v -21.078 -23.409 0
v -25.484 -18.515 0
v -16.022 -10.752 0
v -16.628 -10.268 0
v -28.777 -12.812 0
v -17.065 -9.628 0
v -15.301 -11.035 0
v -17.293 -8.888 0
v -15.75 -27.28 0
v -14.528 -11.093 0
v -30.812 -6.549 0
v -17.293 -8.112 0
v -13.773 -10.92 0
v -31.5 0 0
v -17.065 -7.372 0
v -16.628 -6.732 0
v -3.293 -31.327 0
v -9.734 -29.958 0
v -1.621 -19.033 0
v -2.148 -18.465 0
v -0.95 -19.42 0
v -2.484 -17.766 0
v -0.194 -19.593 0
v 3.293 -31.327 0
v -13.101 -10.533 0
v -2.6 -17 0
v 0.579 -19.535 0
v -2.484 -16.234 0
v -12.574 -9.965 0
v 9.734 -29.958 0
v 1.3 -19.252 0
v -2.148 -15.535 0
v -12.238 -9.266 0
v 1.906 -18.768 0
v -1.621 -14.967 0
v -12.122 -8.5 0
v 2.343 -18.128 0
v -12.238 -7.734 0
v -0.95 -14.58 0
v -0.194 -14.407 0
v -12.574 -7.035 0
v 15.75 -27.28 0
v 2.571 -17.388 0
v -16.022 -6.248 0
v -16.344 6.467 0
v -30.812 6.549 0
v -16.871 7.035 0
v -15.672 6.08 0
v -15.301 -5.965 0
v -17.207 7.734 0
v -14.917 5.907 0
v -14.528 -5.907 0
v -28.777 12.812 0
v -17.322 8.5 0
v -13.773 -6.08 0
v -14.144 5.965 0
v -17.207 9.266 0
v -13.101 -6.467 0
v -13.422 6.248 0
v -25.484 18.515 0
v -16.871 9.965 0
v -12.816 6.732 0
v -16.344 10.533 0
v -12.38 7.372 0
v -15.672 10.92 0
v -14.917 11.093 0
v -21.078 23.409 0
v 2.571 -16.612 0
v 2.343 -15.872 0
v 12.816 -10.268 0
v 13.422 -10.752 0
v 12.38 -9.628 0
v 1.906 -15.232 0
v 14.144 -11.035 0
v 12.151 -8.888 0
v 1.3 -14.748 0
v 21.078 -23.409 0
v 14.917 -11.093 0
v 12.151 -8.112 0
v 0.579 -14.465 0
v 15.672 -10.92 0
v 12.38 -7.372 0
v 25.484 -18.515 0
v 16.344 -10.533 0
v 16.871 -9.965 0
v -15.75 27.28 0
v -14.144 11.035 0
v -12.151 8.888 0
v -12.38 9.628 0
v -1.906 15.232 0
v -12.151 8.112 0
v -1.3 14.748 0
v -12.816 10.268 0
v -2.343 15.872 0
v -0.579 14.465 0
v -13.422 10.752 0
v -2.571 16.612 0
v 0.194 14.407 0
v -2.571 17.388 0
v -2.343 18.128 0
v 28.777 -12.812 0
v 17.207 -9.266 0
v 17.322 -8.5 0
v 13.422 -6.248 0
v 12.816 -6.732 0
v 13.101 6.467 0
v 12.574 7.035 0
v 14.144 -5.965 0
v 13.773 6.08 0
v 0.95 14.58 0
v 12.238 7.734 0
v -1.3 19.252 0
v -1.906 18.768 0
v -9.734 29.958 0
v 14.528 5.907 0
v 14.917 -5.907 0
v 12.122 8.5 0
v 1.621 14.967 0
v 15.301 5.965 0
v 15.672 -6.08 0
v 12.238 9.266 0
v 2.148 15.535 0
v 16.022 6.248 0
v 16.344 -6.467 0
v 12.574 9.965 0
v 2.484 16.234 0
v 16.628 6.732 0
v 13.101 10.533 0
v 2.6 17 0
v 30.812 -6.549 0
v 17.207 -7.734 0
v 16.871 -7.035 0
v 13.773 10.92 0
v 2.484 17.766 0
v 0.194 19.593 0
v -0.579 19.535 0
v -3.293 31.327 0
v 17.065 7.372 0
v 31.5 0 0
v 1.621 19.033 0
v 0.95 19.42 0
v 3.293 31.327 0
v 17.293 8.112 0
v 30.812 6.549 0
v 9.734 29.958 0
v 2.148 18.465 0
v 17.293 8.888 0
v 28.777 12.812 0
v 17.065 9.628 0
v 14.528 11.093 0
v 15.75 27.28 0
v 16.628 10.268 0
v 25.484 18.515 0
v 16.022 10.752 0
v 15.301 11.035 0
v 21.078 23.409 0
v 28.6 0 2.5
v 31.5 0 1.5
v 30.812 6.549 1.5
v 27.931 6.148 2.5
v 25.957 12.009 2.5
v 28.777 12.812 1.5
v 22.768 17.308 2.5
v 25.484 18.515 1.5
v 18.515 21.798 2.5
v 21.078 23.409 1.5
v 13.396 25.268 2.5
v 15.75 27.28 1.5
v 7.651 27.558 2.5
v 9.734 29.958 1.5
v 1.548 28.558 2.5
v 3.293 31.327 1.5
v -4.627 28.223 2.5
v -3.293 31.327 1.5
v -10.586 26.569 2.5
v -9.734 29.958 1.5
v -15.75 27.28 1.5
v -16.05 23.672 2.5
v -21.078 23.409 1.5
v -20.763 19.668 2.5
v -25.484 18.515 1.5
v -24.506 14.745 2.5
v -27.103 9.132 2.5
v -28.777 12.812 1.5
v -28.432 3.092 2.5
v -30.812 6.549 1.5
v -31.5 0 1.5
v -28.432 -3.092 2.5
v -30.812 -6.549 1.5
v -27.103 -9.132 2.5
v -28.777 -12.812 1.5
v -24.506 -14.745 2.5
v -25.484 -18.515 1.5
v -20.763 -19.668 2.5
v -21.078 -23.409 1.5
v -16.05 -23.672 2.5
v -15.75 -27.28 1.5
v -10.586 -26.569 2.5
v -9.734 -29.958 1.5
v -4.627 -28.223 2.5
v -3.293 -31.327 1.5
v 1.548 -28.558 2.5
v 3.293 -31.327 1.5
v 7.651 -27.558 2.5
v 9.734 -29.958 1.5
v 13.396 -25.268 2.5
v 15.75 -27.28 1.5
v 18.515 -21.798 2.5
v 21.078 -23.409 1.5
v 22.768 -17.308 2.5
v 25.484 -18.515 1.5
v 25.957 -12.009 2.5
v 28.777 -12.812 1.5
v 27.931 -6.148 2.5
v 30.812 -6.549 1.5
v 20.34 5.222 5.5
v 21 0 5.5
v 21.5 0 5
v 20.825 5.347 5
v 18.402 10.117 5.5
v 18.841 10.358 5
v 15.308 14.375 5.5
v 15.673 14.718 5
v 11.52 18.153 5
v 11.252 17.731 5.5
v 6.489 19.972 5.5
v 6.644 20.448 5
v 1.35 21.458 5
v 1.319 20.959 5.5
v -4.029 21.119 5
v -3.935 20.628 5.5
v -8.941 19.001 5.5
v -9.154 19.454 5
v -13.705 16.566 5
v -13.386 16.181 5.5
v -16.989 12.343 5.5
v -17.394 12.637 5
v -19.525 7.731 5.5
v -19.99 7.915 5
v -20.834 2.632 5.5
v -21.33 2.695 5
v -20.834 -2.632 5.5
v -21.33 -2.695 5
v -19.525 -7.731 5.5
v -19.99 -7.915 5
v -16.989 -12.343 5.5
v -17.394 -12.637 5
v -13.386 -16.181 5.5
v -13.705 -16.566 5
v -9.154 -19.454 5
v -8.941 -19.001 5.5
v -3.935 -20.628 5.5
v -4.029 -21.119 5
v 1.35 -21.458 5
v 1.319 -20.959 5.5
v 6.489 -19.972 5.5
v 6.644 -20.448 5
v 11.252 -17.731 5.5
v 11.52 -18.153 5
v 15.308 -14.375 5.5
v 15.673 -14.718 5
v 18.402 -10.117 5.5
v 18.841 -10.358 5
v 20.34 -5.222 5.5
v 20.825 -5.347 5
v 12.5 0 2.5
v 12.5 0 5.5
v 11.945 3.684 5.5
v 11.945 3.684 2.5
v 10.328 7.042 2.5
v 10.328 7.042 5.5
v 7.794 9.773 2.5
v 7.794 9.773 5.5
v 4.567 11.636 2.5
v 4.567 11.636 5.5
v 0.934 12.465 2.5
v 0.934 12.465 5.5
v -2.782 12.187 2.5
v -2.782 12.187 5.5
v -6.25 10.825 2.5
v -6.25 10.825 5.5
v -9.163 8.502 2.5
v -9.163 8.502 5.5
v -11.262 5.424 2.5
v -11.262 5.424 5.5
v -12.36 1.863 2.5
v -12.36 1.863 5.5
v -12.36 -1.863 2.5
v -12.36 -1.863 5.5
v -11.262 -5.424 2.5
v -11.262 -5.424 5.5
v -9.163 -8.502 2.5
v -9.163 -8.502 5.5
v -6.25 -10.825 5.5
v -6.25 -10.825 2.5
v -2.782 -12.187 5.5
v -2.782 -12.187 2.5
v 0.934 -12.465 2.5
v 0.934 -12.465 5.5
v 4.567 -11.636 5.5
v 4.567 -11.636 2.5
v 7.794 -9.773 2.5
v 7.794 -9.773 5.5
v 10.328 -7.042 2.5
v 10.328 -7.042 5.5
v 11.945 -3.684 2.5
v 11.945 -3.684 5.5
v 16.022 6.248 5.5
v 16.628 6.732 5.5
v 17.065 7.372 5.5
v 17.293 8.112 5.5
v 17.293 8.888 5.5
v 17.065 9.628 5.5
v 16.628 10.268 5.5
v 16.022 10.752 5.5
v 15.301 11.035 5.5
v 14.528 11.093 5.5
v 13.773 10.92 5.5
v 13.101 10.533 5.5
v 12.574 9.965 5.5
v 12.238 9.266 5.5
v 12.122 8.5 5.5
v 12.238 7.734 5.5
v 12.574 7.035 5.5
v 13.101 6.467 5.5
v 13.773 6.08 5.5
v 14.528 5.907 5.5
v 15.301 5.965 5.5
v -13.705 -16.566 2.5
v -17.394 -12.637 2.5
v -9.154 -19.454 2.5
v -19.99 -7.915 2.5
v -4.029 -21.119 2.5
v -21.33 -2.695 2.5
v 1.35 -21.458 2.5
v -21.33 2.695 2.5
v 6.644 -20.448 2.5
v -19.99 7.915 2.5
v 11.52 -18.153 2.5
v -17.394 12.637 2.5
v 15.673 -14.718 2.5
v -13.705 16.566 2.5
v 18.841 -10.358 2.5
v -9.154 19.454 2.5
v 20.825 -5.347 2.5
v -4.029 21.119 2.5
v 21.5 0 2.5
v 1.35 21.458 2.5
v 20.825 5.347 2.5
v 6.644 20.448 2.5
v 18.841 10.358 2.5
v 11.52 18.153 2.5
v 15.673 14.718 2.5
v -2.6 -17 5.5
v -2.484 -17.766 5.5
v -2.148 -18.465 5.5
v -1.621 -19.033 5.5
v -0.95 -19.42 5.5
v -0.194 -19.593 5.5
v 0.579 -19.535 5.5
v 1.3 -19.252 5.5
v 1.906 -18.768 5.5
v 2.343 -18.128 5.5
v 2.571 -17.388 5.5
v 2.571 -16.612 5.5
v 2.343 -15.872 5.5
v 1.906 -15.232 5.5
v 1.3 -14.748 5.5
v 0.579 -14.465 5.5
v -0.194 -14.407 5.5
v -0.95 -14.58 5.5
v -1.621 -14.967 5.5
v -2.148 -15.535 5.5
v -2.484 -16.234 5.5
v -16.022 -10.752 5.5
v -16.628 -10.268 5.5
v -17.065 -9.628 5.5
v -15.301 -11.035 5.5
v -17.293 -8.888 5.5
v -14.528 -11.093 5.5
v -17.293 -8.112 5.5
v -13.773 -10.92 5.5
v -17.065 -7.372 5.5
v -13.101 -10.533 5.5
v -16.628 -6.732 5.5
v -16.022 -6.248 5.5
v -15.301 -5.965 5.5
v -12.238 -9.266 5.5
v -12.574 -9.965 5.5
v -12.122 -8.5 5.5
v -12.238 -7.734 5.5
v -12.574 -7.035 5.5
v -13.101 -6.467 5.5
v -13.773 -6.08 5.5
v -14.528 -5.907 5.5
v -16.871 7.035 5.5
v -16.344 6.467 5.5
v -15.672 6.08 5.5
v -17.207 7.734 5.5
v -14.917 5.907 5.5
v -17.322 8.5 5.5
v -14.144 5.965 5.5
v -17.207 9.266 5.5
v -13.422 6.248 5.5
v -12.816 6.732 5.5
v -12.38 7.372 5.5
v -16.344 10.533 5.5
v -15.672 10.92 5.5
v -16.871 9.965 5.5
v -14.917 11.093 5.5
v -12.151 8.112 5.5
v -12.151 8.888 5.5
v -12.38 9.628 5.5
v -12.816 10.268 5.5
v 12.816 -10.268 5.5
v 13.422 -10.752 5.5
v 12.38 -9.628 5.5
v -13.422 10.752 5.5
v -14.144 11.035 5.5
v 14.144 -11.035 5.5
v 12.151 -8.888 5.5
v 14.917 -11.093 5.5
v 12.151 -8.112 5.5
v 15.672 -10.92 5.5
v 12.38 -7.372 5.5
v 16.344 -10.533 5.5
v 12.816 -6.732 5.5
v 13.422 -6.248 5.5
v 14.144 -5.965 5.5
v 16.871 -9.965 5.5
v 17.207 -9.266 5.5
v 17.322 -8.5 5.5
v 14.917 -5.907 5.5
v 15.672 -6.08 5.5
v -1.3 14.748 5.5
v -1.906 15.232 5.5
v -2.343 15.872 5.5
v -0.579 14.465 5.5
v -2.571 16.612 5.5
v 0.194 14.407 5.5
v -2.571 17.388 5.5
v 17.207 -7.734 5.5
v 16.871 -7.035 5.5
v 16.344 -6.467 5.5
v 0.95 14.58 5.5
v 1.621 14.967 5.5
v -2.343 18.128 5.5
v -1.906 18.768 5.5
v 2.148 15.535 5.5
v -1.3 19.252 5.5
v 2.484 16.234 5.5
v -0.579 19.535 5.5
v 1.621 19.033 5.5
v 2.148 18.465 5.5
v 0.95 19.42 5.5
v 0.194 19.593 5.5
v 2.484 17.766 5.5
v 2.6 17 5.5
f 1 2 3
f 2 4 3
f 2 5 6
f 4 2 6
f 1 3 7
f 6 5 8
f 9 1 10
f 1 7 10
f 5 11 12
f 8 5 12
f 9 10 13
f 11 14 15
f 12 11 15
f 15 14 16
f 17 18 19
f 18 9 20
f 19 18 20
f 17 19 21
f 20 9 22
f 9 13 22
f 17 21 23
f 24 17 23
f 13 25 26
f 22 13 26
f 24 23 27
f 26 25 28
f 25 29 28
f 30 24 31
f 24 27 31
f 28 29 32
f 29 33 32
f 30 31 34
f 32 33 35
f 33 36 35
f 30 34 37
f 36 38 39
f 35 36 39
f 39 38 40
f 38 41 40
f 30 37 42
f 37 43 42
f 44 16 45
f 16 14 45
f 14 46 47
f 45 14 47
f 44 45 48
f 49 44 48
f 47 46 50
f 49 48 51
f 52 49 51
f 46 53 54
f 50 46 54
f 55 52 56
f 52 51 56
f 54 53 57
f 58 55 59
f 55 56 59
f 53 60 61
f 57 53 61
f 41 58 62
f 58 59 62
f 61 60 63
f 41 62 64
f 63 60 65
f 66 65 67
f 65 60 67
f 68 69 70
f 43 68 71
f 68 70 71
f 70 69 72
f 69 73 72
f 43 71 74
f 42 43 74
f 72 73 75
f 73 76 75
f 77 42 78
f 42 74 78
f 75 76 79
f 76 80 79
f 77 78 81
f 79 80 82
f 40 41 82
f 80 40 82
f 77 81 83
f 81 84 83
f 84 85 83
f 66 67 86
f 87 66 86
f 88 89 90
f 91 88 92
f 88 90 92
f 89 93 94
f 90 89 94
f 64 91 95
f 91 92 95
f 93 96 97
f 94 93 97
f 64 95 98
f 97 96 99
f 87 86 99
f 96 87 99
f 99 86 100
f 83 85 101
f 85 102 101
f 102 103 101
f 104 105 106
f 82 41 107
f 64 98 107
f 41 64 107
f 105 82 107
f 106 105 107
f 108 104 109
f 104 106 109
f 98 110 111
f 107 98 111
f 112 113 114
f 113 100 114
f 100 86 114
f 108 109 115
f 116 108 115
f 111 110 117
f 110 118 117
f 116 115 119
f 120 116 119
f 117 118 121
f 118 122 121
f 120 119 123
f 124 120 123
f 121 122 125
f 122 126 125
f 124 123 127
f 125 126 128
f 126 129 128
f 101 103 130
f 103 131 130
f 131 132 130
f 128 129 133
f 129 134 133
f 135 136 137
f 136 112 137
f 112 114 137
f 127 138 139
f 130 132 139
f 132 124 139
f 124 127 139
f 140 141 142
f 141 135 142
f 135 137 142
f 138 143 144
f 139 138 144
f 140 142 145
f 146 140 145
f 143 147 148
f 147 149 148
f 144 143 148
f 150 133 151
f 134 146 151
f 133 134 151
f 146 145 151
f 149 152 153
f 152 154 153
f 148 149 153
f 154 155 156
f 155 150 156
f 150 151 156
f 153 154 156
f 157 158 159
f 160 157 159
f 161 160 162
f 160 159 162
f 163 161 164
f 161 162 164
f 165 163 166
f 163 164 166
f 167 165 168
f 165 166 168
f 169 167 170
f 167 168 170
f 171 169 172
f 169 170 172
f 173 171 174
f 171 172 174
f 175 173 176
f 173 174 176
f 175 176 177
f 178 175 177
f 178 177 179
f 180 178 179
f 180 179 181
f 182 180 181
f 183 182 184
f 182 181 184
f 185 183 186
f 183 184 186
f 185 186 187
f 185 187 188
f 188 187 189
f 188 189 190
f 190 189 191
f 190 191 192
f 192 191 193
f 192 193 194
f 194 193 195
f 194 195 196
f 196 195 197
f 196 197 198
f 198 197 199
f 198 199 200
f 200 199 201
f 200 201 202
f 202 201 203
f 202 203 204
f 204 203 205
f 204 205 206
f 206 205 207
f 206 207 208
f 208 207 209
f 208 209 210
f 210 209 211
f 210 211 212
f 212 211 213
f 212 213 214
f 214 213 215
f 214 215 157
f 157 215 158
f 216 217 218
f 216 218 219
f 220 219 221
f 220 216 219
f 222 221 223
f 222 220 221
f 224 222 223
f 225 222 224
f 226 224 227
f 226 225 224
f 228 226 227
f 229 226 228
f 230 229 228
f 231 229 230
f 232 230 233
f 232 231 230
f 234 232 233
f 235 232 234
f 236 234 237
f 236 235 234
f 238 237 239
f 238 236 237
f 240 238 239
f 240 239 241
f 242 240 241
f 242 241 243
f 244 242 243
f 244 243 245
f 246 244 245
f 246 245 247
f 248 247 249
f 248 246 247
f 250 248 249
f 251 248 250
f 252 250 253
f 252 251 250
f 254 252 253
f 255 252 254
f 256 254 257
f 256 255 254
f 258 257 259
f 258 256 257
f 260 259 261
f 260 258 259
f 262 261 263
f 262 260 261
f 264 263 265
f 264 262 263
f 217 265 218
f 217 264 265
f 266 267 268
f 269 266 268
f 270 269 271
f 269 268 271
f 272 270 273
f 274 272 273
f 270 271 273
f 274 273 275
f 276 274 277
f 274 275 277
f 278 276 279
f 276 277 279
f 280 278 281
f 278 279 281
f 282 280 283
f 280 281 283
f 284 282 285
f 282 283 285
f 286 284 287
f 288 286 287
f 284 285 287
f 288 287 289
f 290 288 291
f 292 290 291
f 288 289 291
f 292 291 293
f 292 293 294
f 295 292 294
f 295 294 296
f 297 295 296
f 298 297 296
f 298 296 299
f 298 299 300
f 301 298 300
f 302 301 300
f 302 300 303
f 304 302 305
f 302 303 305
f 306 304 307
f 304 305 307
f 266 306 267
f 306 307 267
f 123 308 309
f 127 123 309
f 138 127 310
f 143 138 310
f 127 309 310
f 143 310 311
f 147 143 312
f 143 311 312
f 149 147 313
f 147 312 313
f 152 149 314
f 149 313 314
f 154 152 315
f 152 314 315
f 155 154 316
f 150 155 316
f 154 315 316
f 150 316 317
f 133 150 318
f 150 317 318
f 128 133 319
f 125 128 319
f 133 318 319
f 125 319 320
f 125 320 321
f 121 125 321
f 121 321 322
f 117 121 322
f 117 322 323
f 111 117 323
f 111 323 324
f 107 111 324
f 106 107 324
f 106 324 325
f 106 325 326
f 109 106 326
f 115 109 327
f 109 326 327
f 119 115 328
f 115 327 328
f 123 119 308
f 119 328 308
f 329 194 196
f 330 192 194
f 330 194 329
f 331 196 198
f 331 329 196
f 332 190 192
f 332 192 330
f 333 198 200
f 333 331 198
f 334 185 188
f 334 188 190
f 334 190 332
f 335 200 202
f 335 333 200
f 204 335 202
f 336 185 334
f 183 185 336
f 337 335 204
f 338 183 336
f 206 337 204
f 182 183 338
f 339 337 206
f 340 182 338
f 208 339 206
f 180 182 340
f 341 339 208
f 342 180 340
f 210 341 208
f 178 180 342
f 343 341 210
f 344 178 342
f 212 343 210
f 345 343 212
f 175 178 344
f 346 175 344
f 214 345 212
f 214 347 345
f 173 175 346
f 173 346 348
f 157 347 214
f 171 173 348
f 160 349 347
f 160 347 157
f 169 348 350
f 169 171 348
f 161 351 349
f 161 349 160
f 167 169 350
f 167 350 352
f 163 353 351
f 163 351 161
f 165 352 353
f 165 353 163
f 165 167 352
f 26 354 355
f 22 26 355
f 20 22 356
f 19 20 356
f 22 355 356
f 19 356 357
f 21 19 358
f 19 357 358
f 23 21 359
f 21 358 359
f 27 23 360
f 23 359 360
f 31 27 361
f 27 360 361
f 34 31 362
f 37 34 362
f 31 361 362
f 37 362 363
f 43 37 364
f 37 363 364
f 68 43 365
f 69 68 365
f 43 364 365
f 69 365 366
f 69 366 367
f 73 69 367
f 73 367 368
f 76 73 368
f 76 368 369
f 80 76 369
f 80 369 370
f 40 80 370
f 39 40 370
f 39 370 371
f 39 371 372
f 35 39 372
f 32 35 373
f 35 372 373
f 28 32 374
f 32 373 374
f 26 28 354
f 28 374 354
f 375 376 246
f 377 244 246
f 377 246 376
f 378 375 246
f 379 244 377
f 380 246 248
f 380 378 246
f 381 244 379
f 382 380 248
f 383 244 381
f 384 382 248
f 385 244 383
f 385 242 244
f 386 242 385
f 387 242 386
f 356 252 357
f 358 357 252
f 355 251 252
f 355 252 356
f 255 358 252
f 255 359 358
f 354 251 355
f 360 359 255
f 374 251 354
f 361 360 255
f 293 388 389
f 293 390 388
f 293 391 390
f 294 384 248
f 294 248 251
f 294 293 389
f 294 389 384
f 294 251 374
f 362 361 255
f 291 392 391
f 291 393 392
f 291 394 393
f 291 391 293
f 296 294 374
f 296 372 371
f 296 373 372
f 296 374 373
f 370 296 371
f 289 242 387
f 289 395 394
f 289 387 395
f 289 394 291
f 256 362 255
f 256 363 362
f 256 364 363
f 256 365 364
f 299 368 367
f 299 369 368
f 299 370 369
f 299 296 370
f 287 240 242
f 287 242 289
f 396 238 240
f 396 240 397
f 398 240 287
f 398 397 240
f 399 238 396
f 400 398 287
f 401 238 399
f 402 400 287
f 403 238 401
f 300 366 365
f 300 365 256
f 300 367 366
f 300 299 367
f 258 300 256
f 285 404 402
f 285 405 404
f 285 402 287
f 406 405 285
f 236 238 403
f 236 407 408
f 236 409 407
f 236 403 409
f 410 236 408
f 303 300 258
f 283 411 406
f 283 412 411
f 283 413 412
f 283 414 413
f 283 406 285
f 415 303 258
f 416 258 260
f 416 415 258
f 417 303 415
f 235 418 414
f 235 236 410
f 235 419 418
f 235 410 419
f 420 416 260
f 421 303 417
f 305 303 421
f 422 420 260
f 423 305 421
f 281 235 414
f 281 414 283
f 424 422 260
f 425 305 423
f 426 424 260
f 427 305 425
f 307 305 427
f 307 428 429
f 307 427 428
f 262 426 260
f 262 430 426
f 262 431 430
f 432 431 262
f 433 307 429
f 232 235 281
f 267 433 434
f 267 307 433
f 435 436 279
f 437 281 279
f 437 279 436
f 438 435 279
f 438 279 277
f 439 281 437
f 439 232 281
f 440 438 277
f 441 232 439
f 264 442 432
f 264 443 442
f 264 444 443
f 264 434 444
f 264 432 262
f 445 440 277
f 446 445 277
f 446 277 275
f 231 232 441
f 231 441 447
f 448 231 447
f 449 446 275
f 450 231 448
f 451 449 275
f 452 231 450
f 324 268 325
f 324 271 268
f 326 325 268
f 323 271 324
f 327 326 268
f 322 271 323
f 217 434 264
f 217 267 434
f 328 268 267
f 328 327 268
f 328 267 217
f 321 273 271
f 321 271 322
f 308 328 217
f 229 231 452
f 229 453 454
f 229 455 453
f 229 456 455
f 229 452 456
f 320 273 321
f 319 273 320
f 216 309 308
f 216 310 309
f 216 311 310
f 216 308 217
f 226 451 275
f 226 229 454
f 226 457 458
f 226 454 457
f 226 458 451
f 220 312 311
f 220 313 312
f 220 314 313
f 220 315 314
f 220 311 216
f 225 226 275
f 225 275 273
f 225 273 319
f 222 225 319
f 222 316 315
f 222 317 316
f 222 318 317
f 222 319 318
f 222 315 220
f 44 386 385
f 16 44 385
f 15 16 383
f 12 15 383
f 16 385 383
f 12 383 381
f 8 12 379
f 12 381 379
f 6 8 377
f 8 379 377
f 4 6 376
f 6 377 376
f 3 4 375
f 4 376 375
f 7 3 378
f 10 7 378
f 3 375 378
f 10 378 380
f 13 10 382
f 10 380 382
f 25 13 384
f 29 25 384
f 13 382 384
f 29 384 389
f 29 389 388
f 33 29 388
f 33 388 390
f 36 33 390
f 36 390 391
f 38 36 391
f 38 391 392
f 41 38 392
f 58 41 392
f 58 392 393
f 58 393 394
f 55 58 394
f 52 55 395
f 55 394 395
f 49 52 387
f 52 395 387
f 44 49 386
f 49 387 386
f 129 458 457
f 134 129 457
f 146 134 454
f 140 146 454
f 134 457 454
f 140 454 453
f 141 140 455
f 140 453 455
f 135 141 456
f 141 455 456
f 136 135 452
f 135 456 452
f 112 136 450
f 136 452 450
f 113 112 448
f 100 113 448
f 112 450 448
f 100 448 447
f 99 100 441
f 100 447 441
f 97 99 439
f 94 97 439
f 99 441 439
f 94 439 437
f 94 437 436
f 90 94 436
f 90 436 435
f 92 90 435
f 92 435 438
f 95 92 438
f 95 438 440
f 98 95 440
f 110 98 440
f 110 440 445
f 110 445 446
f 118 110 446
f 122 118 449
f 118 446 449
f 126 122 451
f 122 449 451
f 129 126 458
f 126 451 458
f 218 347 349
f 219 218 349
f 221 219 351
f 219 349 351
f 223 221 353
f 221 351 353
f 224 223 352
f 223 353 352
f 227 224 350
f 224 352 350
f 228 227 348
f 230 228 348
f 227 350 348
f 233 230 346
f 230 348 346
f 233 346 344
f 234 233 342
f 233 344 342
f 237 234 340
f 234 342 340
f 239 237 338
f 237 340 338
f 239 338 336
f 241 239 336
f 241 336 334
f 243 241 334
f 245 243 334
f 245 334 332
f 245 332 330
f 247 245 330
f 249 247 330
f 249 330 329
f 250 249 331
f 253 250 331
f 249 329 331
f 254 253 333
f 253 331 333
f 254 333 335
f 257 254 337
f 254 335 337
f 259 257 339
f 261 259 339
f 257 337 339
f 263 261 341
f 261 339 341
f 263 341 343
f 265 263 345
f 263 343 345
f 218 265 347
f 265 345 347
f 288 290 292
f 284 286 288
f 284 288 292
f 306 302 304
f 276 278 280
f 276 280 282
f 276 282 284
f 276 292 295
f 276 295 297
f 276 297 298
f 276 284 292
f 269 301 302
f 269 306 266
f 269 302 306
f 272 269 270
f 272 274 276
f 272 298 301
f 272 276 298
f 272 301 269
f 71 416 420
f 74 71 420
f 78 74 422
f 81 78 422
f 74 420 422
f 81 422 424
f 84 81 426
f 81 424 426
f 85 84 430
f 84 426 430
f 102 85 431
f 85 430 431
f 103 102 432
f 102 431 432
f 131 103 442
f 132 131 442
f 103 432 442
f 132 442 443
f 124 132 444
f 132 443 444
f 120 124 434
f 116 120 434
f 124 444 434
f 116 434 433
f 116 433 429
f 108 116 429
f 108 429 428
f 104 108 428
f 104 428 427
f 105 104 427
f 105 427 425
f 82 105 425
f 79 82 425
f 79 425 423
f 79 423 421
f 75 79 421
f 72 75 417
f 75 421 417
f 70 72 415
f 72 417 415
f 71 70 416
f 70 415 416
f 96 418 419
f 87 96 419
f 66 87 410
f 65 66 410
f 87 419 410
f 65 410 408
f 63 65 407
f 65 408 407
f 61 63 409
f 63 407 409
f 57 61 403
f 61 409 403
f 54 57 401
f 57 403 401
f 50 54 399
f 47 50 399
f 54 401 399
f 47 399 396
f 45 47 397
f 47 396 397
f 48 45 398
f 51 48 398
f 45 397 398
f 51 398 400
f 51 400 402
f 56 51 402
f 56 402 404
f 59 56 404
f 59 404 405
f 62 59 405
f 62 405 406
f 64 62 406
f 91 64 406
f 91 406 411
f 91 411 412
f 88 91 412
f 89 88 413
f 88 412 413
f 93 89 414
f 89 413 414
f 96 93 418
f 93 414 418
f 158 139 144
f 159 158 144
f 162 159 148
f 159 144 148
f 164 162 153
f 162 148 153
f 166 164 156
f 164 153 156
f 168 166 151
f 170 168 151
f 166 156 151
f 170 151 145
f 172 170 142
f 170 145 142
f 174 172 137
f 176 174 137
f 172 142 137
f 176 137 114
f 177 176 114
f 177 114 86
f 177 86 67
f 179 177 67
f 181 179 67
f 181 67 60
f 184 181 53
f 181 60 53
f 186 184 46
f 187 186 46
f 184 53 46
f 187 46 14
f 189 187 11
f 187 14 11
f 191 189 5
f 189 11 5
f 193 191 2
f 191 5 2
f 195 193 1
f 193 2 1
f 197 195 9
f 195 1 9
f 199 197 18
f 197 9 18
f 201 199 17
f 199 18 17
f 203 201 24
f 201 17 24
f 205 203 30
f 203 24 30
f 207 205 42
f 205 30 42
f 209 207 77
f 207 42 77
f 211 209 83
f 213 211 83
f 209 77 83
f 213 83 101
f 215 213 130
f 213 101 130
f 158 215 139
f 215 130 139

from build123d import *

# Parameters (mm, degrees)
F0_R     = 31.5
F1_DEPTH = 2.5
F2_R     = 21.5
F3_DEPTH = 3
F4_SIZE2 = 1
F4_SIZE  = 2.9
F5_R     = 2.6
F6_DEPTH = 5.5
F8_COUNT = 6
F7_R     = 12.5
F9_DEPTH = 3
F10_SIZE = 0.5


with BuildPart() as f1:
    # F0 (on Top) → F1 (new body)
    with BuildSketch(Plane.XY):
        Circle(F0_R)
    extrude(amount=F1_DEPTH)

    # F2 (on face) → F3 (join)
    with BuildSketch(Plane.XY.offset(2.5)):
        Circle(F2_R)
    extrude(amount=F3_DEPTH)

    # F4
    f4_edges = [f1.edges().sort_by_distance(p)[0] for p in [
        (-31.5, 0, 2.5),
    ]]
    f4_side = f1.faces().sort_by_distance((-30.609045, 0, 2.5))[0]
    chamfer(f4_edges, length=F4_SIZE, length2=F4_SIZE2, reference=f4_side)

    # F5 (on face) → F6 (cut, through all)
    with BuildSketch(Plane.XY.offset(5.5)):
        with Locations((0, 17)):
            Circle(F5_R)
    f6 = extrude(amount=-F6_DEPTH, mode=Mode.SUBTRACT)

    # F8: F6 ×6 about axis
    f8_axis = Axis((0, 0, 5.5), (0, 0, 1))
    for i in range(1, F8_COUNT):
        add(f6.rotate(f8_axis, i * 360 / F8_COUNT), mode=Mode.SUBTRACT)

    # F7 (on face) → F9 (cut)
    with BuildSketch(Plane.XY.offset(5.5)):
        Circle(F7_R)
    extrude(amount=-F9_DEPTH, mode=Mode.SUBTRACT)

    # F10
    f10_edges = [f1.edges().sort_by_distance(p)[0] for p in [
        (-21.5, 0, 5.5),
    ]]
    chamfer(f10_edges, length=F10_SIZE)


solid = f1.part
